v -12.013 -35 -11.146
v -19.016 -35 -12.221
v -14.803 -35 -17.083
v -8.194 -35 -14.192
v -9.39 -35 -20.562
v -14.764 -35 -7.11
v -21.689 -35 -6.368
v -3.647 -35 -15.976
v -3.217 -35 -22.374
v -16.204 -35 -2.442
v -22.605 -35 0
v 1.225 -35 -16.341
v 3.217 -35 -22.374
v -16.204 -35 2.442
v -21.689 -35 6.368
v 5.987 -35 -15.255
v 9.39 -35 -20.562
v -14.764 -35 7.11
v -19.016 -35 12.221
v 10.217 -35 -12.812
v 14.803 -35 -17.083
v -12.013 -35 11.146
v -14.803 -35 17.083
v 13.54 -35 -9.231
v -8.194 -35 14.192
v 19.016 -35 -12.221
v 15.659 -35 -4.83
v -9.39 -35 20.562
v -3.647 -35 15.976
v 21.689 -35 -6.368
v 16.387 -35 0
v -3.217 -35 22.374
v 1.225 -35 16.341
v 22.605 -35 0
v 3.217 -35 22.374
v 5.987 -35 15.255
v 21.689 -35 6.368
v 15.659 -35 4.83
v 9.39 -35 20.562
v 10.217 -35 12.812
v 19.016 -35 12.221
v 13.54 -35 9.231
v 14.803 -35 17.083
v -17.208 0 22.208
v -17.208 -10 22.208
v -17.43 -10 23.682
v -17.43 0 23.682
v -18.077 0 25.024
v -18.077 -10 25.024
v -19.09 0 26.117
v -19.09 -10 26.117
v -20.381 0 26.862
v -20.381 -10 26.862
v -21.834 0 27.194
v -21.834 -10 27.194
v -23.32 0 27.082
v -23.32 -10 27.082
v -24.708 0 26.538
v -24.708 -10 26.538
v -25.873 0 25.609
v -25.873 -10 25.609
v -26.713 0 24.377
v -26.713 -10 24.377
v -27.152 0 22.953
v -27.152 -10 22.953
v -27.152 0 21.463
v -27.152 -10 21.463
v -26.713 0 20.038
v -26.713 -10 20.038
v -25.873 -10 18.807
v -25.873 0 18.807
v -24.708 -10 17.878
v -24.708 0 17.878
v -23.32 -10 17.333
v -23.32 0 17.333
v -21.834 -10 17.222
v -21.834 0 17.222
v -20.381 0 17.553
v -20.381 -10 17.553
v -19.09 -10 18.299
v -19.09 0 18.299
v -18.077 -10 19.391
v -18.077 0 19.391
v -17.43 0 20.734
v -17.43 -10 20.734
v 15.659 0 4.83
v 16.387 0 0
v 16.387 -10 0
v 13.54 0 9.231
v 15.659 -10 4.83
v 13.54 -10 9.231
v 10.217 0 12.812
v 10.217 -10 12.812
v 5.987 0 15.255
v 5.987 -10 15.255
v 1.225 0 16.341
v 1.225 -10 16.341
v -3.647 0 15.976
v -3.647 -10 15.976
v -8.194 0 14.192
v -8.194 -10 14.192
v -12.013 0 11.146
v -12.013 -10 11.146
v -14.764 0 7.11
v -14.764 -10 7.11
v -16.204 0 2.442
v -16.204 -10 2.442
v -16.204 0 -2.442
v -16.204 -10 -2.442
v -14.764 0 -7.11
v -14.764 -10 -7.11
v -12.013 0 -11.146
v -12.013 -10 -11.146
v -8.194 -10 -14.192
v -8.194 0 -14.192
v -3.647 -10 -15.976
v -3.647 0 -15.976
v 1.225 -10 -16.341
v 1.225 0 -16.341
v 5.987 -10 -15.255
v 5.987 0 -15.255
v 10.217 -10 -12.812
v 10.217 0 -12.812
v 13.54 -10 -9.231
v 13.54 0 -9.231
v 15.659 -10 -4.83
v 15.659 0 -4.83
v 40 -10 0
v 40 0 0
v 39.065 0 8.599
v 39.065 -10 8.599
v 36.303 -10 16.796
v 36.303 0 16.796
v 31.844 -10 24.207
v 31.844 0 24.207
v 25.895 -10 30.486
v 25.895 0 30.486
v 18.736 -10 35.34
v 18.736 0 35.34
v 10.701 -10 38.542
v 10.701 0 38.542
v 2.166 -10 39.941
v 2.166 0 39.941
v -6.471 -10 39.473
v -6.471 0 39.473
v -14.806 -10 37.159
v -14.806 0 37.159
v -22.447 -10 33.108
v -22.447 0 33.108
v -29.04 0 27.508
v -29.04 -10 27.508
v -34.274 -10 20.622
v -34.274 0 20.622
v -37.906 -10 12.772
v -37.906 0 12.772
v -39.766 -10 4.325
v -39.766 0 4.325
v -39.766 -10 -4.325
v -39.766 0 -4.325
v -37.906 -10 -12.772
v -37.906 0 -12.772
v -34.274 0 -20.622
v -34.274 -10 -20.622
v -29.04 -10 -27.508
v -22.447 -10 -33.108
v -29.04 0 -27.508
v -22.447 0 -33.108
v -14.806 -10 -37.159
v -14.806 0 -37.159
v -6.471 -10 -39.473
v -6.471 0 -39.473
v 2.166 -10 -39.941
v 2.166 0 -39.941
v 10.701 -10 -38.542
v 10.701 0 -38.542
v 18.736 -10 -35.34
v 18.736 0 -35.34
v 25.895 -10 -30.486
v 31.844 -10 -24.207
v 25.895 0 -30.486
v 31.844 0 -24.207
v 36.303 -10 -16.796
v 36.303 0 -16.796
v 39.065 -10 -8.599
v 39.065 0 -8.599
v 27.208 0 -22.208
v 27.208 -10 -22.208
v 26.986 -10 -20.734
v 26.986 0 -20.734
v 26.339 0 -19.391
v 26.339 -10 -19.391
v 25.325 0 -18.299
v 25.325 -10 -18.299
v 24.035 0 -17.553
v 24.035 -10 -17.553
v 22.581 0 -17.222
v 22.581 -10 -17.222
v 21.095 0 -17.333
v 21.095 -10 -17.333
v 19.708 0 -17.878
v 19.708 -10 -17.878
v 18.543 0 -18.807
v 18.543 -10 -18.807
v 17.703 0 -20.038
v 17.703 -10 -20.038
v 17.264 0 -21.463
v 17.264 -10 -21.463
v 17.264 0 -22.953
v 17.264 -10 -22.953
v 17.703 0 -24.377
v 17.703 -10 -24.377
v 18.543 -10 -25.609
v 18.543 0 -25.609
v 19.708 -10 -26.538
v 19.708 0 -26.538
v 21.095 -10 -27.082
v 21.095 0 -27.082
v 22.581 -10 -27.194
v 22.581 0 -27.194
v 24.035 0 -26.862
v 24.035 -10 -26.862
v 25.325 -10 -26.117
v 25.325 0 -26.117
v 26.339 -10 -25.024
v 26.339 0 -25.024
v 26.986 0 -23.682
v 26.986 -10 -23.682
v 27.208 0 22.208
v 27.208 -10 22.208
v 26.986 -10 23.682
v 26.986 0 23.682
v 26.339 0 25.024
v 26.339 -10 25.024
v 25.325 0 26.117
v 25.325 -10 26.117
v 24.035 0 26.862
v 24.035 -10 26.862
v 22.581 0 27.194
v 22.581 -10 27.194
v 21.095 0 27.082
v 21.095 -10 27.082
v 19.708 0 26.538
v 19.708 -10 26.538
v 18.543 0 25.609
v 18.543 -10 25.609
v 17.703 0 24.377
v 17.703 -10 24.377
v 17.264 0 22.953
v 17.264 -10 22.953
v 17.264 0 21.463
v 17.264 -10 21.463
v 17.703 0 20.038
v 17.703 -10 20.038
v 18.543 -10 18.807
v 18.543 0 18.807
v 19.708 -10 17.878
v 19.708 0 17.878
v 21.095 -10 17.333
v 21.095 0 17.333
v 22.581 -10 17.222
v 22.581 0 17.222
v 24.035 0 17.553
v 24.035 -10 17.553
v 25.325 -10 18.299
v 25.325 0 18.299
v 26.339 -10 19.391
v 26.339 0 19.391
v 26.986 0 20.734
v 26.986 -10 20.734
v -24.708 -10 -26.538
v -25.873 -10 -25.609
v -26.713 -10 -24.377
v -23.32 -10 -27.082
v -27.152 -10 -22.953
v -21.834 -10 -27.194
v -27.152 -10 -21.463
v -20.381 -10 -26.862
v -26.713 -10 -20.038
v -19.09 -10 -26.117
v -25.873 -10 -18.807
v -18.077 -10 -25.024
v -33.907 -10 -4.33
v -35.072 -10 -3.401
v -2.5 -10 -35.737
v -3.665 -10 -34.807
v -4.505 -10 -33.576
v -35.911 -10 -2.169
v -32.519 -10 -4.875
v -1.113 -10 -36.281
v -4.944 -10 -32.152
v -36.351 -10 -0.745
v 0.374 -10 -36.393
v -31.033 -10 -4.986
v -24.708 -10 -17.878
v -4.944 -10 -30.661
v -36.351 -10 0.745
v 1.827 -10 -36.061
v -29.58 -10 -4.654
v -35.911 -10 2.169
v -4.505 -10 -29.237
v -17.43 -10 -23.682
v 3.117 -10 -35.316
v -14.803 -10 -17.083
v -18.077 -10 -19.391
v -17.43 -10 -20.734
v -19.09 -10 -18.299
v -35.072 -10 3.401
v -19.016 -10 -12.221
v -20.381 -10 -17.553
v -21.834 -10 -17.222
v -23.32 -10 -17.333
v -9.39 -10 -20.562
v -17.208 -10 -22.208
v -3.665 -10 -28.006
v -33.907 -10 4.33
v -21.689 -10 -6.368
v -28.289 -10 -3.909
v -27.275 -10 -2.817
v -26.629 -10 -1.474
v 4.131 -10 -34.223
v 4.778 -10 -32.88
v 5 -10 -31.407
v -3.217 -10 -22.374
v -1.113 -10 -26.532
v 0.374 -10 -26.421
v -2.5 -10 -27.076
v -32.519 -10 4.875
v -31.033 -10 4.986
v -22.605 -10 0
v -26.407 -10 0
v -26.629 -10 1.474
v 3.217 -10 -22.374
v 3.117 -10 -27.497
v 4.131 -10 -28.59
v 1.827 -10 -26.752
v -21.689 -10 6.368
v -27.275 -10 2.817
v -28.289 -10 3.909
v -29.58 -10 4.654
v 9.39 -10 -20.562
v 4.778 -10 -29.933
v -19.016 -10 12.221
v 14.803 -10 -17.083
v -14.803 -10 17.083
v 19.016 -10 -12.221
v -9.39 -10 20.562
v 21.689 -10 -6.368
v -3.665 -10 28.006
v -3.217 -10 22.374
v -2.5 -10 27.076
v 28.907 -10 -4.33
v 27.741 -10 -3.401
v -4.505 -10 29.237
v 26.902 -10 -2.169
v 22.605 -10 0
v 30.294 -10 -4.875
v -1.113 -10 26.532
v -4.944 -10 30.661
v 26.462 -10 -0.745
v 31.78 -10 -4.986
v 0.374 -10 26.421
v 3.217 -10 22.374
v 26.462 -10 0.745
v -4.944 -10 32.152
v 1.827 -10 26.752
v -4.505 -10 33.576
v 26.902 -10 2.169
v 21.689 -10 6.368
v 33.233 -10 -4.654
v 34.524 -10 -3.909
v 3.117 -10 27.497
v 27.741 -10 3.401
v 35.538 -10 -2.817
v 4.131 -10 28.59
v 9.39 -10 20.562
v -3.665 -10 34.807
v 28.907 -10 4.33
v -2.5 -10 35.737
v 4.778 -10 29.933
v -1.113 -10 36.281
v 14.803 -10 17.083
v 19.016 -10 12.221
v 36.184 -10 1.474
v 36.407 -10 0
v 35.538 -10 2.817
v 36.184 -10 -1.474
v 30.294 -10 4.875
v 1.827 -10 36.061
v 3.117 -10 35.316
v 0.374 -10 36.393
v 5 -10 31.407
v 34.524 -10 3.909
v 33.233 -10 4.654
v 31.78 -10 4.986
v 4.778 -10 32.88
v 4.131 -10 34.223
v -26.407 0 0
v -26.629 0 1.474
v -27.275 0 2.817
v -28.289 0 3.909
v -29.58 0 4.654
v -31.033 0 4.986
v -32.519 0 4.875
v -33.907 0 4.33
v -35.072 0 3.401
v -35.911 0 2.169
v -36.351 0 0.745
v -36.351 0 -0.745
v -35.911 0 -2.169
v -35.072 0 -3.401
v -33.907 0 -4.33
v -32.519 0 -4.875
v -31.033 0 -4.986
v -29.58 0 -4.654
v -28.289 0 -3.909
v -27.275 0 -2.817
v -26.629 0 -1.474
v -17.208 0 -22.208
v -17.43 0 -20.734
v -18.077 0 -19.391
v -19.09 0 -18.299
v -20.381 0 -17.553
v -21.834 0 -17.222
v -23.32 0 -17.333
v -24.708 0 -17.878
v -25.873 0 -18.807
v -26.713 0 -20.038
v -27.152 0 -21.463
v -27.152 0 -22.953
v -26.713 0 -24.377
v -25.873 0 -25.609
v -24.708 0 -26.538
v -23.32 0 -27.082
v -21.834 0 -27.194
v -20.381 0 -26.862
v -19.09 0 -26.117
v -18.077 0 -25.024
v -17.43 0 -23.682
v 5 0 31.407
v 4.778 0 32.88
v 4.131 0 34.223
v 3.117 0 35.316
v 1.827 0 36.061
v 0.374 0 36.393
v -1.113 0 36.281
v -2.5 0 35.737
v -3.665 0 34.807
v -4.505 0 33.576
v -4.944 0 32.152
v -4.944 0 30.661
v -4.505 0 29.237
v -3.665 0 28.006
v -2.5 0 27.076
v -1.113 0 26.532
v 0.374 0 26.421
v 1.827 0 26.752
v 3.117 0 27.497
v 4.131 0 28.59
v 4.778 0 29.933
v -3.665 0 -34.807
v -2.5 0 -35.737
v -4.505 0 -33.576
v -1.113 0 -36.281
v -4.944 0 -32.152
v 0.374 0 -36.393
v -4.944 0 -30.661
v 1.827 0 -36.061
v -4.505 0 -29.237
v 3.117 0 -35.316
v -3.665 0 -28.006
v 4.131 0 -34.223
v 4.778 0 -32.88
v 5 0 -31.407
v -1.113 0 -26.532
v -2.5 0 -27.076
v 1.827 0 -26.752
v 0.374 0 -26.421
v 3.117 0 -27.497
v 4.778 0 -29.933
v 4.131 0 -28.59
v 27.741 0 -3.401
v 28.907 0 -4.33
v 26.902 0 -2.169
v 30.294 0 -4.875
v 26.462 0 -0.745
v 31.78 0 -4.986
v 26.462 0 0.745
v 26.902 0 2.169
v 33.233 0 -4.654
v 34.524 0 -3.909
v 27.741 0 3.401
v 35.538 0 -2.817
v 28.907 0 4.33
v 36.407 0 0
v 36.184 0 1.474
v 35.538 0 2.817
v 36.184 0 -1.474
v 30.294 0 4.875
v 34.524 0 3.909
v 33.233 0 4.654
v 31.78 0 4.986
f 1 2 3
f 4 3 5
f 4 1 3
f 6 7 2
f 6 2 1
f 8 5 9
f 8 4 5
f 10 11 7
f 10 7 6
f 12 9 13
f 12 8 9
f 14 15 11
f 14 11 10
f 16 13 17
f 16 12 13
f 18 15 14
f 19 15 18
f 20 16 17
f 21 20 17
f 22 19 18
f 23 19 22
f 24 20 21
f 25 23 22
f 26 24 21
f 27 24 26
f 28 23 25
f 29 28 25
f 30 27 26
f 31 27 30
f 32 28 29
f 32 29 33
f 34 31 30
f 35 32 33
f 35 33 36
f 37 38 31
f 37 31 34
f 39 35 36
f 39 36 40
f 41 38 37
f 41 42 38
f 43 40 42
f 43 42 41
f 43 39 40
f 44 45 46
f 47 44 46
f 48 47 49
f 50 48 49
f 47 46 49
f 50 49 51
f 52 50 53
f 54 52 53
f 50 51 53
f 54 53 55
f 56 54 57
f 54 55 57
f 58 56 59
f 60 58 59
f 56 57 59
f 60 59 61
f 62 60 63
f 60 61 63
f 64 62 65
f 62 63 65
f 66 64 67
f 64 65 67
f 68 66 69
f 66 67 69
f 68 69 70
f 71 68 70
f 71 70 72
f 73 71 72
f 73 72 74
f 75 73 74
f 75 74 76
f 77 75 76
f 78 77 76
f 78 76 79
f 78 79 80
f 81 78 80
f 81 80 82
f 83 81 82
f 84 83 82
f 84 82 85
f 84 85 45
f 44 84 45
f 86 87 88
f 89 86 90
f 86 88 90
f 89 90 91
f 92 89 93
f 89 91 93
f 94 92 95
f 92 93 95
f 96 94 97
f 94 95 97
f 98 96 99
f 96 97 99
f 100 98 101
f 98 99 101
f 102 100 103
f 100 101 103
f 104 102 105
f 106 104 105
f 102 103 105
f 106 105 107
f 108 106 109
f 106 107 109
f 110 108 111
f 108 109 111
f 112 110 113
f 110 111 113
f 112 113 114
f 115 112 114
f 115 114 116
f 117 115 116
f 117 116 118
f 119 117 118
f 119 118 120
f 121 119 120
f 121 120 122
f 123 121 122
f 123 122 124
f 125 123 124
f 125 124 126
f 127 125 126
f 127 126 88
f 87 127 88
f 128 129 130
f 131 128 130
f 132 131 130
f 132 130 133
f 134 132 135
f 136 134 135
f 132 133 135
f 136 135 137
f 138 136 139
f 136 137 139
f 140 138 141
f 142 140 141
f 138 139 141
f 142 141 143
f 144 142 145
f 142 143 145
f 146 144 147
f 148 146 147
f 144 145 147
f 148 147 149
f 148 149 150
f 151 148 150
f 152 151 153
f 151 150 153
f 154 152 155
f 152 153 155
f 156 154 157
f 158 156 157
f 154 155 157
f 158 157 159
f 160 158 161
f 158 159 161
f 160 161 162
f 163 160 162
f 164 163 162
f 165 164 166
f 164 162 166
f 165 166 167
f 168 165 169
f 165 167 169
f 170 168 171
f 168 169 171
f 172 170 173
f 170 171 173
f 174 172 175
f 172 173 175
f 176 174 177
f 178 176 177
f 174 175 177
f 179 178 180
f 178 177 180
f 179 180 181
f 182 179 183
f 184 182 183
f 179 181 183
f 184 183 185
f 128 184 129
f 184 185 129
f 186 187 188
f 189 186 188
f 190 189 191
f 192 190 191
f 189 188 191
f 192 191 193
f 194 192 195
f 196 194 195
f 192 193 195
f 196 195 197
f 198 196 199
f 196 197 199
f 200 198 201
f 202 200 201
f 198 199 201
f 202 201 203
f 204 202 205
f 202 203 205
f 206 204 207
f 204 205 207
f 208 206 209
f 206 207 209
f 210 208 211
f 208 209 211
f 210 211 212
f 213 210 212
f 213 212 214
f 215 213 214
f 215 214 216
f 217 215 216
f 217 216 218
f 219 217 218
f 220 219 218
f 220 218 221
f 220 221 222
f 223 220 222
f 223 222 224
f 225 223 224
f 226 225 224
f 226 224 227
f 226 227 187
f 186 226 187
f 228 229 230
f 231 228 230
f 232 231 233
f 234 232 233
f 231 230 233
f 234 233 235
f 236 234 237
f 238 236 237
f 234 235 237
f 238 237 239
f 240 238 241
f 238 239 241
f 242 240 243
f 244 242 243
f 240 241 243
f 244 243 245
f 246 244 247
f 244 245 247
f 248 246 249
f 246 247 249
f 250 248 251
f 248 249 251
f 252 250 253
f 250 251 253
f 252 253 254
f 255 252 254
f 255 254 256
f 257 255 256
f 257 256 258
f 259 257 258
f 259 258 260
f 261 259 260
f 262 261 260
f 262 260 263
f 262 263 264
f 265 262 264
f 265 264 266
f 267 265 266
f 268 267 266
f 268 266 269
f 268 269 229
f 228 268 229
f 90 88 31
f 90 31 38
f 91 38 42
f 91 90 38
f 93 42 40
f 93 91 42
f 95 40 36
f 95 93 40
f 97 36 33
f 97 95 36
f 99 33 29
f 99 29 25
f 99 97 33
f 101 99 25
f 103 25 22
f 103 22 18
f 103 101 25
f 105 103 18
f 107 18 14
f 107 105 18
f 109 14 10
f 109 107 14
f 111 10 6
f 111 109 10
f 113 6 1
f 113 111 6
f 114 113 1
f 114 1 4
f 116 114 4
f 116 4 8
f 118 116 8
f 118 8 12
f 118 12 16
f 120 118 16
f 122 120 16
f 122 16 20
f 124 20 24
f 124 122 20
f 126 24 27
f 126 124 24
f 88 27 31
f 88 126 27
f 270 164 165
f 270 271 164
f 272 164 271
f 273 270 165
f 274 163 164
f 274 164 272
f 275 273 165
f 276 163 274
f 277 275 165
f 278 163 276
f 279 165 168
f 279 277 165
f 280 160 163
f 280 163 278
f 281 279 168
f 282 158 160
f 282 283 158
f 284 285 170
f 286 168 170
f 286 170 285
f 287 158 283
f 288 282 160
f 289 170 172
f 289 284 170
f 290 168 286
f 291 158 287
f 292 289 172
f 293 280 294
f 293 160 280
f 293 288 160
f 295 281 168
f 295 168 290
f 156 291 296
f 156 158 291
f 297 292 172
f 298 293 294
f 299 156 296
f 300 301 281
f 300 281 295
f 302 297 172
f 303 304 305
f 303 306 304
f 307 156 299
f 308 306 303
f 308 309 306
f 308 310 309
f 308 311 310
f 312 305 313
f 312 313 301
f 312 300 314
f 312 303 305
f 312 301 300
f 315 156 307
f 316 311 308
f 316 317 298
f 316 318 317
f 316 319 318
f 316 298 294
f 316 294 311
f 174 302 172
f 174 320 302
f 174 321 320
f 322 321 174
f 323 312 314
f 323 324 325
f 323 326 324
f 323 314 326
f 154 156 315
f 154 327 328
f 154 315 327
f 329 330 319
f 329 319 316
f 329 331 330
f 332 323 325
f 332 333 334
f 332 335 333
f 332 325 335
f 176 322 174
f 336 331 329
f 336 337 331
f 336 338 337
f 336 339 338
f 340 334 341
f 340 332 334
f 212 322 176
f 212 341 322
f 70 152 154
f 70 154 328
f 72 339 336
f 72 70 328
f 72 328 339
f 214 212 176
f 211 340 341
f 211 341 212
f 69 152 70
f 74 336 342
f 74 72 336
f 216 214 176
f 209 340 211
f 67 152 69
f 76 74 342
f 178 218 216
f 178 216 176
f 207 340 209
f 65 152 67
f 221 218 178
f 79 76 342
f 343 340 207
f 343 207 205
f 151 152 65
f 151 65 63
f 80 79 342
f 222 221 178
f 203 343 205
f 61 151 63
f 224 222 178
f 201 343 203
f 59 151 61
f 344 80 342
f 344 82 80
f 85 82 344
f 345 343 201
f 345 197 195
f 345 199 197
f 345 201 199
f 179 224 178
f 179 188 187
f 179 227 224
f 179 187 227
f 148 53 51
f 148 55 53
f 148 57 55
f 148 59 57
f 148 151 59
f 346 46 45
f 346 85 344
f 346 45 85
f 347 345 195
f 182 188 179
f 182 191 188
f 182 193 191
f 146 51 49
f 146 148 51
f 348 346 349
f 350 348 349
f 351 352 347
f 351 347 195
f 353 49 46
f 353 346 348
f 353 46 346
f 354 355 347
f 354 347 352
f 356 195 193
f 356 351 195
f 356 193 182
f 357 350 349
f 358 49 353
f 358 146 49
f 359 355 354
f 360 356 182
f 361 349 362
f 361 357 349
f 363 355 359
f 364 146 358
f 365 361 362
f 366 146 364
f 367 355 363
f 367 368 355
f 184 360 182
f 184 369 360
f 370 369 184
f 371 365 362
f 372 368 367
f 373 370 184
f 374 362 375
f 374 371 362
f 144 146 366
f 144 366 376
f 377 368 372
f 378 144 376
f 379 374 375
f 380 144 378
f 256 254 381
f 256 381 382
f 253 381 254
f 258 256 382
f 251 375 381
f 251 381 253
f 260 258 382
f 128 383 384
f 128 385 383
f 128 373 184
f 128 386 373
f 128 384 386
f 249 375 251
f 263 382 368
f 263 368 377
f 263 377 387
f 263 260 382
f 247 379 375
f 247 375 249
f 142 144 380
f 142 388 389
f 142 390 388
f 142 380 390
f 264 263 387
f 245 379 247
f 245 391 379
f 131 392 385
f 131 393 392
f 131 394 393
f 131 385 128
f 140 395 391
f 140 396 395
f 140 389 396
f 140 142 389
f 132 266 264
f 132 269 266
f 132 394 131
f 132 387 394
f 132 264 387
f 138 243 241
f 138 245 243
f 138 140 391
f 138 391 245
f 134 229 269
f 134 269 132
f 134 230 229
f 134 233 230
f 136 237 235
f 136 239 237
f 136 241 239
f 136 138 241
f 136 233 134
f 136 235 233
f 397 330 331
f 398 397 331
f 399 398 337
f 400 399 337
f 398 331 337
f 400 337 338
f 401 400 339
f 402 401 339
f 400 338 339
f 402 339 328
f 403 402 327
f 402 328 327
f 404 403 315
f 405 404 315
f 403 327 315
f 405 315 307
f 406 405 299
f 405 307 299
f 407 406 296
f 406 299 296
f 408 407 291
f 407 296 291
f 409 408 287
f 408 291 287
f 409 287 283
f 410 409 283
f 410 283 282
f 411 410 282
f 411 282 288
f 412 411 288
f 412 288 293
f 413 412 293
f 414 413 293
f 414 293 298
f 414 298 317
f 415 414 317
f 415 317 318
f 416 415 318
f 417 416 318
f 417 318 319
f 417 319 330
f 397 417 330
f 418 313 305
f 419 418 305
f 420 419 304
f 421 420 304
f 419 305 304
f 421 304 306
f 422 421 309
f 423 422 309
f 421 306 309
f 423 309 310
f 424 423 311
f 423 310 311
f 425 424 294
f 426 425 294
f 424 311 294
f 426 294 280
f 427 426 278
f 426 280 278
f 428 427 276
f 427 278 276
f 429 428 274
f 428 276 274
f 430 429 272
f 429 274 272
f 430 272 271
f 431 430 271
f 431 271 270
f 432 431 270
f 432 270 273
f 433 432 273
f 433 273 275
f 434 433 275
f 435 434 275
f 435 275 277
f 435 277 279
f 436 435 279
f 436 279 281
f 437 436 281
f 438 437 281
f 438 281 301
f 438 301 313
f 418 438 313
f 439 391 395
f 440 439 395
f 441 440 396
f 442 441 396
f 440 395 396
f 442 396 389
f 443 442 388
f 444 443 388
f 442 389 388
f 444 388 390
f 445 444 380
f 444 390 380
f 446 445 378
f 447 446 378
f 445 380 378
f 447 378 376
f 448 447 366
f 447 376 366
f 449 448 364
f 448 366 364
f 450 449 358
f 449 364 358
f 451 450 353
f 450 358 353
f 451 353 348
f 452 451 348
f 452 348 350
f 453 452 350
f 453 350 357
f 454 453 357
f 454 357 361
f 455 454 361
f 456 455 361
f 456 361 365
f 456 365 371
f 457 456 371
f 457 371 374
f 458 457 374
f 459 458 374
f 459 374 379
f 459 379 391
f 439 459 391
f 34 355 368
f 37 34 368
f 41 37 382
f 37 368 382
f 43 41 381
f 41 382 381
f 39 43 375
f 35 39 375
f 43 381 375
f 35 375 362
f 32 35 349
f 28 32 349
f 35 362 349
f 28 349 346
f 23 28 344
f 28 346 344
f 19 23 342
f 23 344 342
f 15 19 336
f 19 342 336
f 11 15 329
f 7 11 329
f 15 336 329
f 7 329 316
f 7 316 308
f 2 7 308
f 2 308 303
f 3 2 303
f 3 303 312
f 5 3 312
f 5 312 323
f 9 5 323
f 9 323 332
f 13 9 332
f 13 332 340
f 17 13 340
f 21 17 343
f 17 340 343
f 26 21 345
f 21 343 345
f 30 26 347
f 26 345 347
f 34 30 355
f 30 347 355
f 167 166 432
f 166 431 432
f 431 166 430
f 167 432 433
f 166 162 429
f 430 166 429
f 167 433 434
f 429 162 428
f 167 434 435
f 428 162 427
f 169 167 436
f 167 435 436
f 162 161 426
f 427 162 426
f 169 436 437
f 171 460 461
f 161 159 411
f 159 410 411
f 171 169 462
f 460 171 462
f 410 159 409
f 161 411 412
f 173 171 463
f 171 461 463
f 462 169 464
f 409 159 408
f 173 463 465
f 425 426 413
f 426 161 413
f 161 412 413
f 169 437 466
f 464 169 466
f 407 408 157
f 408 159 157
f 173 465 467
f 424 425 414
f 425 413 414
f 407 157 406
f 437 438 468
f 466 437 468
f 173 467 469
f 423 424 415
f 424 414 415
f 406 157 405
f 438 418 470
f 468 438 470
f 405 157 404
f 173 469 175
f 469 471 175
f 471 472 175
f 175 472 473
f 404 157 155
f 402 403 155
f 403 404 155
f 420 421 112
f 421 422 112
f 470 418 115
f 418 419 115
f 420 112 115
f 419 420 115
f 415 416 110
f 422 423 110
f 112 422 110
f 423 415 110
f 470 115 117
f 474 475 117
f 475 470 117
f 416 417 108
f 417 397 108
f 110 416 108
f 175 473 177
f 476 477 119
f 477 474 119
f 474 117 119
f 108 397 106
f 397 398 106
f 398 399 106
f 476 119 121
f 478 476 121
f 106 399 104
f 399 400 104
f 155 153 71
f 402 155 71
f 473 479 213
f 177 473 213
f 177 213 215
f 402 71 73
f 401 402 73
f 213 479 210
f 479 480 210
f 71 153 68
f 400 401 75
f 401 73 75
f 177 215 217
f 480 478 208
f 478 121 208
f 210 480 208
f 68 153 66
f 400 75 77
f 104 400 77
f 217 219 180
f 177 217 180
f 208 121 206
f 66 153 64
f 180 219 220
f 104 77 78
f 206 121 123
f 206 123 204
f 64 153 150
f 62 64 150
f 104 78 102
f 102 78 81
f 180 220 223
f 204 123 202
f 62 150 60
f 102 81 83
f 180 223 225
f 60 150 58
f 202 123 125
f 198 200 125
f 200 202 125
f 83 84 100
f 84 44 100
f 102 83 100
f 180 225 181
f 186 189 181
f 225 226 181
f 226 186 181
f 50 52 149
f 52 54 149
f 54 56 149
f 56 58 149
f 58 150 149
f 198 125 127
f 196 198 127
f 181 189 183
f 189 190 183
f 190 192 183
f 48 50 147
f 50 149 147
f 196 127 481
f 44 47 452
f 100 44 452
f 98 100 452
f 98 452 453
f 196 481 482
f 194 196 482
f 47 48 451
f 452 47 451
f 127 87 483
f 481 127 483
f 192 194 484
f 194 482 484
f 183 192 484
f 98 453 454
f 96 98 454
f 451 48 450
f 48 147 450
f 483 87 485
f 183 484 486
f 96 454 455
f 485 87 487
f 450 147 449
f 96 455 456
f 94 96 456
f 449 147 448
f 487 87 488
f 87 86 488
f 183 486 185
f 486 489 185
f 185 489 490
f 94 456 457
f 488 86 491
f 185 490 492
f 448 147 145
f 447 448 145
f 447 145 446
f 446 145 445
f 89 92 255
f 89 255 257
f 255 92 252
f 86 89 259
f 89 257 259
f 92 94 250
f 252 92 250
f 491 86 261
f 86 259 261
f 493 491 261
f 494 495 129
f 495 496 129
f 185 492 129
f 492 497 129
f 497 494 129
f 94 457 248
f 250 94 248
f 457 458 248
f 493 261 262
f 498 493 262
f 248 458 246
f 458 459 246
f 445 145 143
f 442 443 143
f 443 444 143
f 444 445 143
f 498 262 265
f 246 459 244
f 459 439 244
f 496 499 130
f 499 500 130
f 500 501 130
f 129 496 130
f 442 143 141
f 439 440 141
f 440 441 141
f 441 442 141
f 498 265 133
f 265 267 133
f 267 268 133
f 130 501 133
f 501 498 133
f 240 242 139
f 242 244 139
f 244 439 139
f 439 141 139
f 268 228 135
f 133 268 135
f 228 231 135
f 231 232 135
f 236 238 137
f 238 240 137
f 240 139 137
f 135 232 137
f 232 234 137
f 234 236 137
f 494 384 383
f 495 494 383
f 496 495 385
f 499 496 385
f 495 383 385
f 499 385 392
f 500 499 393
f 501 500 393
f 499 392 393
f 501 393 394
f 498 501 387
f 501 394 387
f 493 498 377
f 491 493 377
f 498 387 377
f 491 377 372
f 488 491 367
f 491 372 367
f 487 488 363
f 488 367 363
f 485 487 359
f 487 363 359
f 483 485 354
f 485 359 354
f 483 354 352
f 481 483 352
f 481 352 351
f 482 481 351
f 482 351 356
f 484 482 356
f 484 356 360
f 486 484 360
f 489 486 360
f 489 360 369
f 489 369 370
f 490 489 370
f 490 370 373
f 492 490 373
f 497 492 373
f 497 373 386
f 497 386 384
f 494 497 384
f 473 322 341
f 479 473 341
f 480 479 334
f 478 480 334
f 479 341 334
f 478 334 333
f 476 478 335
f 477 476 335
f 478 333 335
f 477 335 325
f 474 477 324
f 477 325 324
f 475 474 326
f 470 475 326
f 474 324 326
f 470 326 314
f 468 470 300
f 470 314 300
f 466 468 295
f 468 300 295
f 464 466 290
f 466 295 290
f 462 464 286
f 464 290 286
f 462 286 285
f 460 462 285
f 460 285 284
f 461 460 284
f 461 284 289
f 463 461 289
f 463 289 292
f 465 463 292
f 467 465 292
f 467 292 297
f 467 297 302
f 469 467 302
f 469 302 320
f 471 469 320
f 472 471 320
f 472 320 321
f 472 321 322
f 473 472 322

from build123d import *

# Parameters (mm, degrees)
F0_R      = 40
F1_DEPTH  = 10
F2_R      = 22.604582
F2_R_2    = 16.387311
F3_DEPTH  = 25
F3_FACE_R = 16.387311
F4_DEPTH  = 25
F5_R      = 5
F6_DEPTH  = 25


with BuildPart() as f1:
    # F0 (on Front) → F1 (new body)
    with BuildSketch(Plane.XZ):
        Circle(F0_R)
    extrude(amount=F1_DEPTH)

    # F2 (on face) → F3 (join)
    with BuildSketch(Plane.XZ.offset(10)):
        Circle(F2_R)
        Circle(F2_R_2, mode=Mode.SUBTRACT)
    extrude(amount=F3_DEPTH)

    # F3_face (on face) → F4 (cut)
    with BuildSketch(Plane.XZ.offset(10)):
        Circle(F3_FACE_R)
    extrude(amount=-F4_DEPTH, mode=Mode.SUBTRACT)

    # F5 (on face) → F6 (cut)
    with BuildSketch(Plane.XZ.offset(10)):
        with Locations((0, 31.406611)):
            Circle(F5_R)
        with Locations((-22.207828, 22.207828)):
            Circle(F5_R)
        with Locations((-31.406611, 0)):
            Circle(F5_R)
        with Locations((-22.207828, -22.207828)):
            Circle(F5_R)
        with Locations((0, -31.406611)):
            Circle(F5_R)
        with Locations((22.207828, -22.207828)):
            Circle(F5_R)
        with Locations((31.406611, 0)):
            Circle(F5_R)
        with Locations((22.207828, 22.207828)):
            Circle(F5_R)
    extrude(amount=-F6_DEPTH, mode=Mode.SUBTRACT)


solid = f1.part
